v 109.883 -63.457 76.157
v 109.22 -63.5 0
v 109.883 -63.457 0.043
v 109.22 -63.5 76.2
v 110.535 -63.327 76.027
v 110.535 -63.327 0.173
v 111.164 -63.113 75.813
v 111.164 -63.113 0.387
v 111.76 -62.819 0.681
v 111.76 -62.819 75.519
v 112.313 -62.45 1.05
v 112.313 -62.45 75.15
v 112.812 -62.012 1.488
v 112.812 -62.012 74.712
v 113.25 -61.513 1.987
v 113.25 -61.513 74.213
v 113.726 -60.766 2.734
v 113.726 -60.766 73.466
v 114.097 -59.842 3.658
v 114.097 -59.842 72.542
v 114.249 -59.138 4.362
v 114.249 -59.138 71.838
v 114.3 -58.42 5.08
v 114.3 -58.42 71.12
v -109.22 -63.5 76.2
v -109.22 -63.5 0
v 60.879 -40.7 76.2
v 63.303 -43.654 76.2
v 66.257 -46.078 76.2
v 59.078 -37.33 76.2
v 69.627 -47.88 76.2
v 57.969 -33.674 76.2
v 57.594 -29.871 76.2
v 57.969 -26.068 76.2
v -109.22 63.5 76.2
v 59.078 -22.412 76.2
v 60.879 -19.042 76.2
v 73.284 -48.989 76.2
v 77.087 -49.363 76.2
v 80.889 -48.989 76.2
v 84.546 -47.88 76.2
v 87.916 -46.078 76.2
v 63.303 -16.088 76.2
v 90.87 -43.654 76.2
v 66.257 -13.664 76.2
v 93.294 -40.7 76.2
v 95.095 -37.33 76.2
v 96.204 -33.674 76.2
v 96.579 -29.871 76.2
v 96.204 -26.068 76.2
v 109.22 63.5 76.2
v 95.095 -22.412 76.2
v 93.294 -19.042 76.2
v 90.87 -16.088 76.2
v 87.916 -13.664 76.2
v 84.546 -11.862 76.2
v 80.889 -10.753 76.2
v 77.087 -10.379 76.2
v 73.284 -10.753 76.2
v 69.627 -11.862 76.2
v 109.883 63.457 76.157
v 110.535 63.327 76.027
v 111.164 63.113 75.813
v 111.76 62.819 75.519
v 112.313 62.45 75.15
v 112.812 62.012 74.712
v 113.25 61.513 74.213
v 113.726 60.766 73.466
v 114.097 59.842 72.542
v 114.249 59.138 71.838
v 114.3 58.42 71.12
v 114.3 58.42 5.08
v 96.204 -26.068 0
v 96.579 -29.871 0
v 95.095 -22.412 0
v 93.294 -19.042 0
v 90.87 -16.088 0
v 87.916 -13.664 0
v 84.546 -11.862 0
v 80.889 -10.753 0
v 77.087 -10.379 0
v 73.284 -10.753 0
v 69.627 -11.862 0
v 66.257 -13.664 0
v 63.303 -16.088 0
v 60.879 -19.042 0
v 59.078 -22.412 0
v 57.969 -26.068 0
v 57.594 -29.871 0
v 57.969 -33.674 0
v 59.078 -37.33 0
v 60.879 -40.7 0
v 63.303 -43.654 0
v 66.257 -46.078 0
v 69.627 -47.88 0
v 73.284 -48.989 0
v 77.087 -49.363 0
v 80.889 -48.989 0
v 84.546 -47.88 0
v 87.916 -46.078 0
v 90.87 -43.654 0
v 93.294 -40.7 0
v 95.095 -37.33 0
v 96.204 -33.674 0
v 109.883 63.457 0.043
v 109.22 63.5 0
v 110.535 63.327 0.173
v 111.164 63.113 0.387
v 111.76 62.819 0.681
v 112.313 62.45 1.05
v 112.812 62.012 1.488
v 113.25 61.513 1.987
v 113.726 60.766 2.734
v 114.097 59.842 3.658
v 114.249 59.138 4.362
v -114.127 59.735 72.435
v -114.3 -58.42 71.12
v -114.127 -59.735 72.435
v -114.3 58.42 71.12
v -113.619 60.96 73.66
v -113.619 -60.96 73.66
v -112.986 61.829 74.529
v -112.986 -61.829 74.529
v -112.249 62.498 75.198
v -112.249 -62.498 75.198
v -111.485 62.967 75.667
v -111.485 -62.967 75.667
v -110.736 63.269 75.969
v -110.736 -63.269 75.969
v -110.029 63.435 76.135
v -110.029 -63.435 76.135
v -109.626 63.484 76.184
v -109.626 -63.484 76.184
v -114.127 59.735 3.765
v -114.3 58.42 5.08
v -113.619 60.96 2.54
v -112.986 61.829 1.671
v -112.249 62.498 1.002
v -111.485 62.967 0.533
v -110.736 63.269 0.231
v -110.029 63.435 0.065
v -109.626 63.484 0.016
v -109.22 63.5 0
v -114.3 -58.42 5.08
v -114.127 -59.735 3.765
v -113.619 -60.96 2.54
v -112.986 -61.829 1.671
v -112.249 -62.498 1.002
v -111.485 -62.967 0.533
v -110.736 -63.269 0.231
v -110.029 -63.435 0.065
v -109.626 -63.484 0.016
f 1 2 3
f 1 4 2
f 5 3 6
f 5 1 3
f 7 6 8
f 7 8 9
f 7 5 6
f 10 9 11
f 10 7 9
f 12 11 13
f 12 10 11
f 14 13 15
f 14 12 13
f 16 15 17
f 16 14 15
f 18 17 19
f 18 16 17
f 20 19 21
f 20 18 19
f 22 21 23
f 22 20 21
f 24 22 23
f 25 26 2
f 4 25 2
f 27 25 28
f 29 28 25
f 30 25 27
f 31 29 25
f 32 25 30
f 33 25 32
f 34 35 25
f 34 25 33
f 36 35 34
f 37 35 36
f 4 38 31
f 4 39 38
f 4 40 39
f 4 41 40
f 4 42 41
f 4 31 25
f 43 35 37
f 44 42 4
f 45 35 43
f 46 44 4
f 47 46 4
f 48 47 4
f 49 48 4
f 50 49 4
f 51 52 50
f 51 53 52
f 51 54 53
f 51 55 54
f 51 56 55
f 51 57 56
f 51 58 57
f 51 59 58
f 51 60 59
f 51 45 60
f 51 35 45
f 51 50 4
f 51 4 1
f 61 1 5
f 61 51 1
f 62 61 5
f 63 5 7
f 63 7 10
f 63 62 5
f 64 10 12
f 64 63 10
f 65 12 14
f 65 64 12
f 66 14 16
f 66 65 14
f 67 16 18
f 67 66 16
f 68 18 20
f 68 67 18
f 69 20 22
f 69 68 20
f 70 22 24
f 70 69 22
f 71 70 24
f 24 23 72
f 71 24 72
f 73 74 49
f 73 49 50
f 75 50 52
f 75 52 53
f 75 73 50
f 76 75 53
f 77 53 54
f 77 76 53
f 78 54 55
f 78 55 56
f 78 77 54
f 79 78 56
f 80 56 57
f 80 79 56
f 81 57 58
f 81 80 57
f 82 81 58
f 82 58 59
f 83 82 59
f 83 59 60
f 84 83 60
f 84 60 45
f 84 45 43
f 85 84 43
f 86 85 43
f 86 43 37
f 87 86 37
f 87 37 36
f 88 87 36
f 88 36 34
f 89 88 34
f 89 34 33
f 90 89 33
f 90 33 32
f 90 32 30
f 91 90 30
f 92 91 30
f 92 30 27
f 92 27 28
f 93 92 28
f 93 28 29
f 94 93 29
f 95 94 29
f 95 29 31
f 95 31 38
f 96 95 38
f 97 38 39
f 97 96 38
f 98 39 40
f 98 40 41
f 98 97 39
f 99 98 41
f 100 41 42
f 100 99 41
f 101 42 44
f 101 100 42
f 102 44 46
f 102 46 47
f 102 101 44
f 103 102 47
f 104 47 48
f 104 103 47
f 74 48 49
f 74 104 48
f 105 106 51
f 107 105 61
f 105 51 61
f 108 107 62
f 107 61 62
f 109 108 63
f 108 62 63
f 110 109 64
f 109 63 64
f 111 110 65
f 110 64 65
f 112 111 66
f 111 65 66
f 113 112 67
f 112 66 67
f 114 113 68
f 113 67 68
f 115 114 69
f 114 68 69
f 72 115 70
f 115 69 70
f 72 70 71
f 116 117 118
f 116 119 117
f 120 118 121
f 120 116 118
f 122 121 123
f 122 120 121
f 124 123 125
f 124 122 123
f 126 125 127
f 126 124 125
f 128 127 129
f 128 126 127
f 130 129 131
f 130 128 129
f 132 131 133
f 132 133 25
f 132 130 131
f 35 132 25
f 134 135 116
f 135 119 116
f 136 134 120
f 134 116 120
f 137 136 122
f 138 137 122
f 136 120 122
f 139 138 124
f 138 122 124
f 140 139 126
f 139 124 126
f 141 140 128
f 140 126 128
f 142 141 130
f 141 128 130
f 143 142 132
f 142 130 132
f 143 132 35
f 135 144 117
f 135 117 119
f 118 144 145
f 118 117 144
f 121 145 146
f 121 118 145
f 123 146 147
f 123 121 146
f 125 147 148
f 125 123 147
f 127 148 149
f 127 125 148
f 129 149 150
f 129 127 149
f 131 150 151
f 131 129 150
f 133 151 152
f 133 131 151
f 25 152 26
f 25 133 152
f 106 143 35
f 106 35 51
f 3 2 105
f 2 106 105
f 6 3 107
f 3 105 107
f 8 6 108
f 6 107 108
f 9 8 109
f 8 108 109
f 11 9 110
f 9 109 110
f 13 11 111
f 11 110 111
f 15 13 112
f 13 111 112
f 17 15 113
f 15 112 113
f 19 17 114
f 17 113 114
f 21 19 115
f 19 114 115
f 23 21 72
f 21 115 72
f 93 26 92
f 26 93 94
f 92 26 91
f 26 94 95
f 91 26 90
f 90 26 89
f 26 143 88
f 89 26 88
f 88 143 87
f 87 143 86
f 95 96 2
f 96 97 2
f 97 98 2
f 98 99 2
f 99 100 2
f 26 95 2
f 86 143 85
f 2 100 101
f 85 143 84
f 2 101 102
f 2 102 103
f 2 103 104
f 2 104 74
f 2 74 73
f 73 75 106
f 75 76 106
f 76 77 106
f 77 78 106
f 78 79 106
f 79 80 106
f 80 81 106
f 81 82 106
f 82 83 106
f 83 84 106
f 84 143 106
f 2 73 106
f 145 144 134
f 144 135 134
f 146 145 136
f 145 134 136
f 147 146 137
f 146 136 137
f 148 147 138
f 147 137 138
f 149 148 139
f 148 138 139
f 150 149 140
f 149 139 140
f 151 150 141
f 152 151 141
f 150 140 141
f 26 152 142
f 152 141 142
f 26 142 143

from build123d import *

# Parameters (mm, degrees)
F0_W     = 228.6
F0_H     = 127
F0_R     = 19.492396
F1_DEPTH = 76.2
F2_R     = 5.08
F3_R     = 5.08
F4_DEPTH = 25.4


with BuildPart() as f1:
    # F0 (on Top) → F1 (new body)
    with BuildSketch(Plane.XY):
        Rectangle(F0_W, F0_H)
        with Locations((77.086605, -29.871058)):
            Circle(F0_R, mode=Mode.SUBTRACT)
    extrude(amount=F1_DEPTH)

    # F2
    f2_edges = [f1.edges().sort_by_distance(p)[0] for p in [
        (-114.3, 63.5, 38.1),
        (-114.3, -63.5, 38.1),
        (-114.3, 0, 0),
        (-114.3, 0, 76.2),
    ]]
    fillet(f2_edges, radius=F2_R)

    # F3
    f3_edges = [f1.edges().sort_by_distance(p)[0] for p in [
        (114.3, -63.5, 38.1),
        (114.3, 63.5, 38.1),
        (114.3, 0, 0),
        (114.3, 0, 76.2),
    ]]
    fillet(f3_edges, radius=F3_R)

    # F0 (on Top) → F4 (cut)
    with BuildSketch(Plane.XY):
        with Locations((77.086605, -29.871058)):
            Circle(F0_R)
    extrude(amount=F4_DEPTH, mode=Mode.SUBTRACT)


solid = f1.part
